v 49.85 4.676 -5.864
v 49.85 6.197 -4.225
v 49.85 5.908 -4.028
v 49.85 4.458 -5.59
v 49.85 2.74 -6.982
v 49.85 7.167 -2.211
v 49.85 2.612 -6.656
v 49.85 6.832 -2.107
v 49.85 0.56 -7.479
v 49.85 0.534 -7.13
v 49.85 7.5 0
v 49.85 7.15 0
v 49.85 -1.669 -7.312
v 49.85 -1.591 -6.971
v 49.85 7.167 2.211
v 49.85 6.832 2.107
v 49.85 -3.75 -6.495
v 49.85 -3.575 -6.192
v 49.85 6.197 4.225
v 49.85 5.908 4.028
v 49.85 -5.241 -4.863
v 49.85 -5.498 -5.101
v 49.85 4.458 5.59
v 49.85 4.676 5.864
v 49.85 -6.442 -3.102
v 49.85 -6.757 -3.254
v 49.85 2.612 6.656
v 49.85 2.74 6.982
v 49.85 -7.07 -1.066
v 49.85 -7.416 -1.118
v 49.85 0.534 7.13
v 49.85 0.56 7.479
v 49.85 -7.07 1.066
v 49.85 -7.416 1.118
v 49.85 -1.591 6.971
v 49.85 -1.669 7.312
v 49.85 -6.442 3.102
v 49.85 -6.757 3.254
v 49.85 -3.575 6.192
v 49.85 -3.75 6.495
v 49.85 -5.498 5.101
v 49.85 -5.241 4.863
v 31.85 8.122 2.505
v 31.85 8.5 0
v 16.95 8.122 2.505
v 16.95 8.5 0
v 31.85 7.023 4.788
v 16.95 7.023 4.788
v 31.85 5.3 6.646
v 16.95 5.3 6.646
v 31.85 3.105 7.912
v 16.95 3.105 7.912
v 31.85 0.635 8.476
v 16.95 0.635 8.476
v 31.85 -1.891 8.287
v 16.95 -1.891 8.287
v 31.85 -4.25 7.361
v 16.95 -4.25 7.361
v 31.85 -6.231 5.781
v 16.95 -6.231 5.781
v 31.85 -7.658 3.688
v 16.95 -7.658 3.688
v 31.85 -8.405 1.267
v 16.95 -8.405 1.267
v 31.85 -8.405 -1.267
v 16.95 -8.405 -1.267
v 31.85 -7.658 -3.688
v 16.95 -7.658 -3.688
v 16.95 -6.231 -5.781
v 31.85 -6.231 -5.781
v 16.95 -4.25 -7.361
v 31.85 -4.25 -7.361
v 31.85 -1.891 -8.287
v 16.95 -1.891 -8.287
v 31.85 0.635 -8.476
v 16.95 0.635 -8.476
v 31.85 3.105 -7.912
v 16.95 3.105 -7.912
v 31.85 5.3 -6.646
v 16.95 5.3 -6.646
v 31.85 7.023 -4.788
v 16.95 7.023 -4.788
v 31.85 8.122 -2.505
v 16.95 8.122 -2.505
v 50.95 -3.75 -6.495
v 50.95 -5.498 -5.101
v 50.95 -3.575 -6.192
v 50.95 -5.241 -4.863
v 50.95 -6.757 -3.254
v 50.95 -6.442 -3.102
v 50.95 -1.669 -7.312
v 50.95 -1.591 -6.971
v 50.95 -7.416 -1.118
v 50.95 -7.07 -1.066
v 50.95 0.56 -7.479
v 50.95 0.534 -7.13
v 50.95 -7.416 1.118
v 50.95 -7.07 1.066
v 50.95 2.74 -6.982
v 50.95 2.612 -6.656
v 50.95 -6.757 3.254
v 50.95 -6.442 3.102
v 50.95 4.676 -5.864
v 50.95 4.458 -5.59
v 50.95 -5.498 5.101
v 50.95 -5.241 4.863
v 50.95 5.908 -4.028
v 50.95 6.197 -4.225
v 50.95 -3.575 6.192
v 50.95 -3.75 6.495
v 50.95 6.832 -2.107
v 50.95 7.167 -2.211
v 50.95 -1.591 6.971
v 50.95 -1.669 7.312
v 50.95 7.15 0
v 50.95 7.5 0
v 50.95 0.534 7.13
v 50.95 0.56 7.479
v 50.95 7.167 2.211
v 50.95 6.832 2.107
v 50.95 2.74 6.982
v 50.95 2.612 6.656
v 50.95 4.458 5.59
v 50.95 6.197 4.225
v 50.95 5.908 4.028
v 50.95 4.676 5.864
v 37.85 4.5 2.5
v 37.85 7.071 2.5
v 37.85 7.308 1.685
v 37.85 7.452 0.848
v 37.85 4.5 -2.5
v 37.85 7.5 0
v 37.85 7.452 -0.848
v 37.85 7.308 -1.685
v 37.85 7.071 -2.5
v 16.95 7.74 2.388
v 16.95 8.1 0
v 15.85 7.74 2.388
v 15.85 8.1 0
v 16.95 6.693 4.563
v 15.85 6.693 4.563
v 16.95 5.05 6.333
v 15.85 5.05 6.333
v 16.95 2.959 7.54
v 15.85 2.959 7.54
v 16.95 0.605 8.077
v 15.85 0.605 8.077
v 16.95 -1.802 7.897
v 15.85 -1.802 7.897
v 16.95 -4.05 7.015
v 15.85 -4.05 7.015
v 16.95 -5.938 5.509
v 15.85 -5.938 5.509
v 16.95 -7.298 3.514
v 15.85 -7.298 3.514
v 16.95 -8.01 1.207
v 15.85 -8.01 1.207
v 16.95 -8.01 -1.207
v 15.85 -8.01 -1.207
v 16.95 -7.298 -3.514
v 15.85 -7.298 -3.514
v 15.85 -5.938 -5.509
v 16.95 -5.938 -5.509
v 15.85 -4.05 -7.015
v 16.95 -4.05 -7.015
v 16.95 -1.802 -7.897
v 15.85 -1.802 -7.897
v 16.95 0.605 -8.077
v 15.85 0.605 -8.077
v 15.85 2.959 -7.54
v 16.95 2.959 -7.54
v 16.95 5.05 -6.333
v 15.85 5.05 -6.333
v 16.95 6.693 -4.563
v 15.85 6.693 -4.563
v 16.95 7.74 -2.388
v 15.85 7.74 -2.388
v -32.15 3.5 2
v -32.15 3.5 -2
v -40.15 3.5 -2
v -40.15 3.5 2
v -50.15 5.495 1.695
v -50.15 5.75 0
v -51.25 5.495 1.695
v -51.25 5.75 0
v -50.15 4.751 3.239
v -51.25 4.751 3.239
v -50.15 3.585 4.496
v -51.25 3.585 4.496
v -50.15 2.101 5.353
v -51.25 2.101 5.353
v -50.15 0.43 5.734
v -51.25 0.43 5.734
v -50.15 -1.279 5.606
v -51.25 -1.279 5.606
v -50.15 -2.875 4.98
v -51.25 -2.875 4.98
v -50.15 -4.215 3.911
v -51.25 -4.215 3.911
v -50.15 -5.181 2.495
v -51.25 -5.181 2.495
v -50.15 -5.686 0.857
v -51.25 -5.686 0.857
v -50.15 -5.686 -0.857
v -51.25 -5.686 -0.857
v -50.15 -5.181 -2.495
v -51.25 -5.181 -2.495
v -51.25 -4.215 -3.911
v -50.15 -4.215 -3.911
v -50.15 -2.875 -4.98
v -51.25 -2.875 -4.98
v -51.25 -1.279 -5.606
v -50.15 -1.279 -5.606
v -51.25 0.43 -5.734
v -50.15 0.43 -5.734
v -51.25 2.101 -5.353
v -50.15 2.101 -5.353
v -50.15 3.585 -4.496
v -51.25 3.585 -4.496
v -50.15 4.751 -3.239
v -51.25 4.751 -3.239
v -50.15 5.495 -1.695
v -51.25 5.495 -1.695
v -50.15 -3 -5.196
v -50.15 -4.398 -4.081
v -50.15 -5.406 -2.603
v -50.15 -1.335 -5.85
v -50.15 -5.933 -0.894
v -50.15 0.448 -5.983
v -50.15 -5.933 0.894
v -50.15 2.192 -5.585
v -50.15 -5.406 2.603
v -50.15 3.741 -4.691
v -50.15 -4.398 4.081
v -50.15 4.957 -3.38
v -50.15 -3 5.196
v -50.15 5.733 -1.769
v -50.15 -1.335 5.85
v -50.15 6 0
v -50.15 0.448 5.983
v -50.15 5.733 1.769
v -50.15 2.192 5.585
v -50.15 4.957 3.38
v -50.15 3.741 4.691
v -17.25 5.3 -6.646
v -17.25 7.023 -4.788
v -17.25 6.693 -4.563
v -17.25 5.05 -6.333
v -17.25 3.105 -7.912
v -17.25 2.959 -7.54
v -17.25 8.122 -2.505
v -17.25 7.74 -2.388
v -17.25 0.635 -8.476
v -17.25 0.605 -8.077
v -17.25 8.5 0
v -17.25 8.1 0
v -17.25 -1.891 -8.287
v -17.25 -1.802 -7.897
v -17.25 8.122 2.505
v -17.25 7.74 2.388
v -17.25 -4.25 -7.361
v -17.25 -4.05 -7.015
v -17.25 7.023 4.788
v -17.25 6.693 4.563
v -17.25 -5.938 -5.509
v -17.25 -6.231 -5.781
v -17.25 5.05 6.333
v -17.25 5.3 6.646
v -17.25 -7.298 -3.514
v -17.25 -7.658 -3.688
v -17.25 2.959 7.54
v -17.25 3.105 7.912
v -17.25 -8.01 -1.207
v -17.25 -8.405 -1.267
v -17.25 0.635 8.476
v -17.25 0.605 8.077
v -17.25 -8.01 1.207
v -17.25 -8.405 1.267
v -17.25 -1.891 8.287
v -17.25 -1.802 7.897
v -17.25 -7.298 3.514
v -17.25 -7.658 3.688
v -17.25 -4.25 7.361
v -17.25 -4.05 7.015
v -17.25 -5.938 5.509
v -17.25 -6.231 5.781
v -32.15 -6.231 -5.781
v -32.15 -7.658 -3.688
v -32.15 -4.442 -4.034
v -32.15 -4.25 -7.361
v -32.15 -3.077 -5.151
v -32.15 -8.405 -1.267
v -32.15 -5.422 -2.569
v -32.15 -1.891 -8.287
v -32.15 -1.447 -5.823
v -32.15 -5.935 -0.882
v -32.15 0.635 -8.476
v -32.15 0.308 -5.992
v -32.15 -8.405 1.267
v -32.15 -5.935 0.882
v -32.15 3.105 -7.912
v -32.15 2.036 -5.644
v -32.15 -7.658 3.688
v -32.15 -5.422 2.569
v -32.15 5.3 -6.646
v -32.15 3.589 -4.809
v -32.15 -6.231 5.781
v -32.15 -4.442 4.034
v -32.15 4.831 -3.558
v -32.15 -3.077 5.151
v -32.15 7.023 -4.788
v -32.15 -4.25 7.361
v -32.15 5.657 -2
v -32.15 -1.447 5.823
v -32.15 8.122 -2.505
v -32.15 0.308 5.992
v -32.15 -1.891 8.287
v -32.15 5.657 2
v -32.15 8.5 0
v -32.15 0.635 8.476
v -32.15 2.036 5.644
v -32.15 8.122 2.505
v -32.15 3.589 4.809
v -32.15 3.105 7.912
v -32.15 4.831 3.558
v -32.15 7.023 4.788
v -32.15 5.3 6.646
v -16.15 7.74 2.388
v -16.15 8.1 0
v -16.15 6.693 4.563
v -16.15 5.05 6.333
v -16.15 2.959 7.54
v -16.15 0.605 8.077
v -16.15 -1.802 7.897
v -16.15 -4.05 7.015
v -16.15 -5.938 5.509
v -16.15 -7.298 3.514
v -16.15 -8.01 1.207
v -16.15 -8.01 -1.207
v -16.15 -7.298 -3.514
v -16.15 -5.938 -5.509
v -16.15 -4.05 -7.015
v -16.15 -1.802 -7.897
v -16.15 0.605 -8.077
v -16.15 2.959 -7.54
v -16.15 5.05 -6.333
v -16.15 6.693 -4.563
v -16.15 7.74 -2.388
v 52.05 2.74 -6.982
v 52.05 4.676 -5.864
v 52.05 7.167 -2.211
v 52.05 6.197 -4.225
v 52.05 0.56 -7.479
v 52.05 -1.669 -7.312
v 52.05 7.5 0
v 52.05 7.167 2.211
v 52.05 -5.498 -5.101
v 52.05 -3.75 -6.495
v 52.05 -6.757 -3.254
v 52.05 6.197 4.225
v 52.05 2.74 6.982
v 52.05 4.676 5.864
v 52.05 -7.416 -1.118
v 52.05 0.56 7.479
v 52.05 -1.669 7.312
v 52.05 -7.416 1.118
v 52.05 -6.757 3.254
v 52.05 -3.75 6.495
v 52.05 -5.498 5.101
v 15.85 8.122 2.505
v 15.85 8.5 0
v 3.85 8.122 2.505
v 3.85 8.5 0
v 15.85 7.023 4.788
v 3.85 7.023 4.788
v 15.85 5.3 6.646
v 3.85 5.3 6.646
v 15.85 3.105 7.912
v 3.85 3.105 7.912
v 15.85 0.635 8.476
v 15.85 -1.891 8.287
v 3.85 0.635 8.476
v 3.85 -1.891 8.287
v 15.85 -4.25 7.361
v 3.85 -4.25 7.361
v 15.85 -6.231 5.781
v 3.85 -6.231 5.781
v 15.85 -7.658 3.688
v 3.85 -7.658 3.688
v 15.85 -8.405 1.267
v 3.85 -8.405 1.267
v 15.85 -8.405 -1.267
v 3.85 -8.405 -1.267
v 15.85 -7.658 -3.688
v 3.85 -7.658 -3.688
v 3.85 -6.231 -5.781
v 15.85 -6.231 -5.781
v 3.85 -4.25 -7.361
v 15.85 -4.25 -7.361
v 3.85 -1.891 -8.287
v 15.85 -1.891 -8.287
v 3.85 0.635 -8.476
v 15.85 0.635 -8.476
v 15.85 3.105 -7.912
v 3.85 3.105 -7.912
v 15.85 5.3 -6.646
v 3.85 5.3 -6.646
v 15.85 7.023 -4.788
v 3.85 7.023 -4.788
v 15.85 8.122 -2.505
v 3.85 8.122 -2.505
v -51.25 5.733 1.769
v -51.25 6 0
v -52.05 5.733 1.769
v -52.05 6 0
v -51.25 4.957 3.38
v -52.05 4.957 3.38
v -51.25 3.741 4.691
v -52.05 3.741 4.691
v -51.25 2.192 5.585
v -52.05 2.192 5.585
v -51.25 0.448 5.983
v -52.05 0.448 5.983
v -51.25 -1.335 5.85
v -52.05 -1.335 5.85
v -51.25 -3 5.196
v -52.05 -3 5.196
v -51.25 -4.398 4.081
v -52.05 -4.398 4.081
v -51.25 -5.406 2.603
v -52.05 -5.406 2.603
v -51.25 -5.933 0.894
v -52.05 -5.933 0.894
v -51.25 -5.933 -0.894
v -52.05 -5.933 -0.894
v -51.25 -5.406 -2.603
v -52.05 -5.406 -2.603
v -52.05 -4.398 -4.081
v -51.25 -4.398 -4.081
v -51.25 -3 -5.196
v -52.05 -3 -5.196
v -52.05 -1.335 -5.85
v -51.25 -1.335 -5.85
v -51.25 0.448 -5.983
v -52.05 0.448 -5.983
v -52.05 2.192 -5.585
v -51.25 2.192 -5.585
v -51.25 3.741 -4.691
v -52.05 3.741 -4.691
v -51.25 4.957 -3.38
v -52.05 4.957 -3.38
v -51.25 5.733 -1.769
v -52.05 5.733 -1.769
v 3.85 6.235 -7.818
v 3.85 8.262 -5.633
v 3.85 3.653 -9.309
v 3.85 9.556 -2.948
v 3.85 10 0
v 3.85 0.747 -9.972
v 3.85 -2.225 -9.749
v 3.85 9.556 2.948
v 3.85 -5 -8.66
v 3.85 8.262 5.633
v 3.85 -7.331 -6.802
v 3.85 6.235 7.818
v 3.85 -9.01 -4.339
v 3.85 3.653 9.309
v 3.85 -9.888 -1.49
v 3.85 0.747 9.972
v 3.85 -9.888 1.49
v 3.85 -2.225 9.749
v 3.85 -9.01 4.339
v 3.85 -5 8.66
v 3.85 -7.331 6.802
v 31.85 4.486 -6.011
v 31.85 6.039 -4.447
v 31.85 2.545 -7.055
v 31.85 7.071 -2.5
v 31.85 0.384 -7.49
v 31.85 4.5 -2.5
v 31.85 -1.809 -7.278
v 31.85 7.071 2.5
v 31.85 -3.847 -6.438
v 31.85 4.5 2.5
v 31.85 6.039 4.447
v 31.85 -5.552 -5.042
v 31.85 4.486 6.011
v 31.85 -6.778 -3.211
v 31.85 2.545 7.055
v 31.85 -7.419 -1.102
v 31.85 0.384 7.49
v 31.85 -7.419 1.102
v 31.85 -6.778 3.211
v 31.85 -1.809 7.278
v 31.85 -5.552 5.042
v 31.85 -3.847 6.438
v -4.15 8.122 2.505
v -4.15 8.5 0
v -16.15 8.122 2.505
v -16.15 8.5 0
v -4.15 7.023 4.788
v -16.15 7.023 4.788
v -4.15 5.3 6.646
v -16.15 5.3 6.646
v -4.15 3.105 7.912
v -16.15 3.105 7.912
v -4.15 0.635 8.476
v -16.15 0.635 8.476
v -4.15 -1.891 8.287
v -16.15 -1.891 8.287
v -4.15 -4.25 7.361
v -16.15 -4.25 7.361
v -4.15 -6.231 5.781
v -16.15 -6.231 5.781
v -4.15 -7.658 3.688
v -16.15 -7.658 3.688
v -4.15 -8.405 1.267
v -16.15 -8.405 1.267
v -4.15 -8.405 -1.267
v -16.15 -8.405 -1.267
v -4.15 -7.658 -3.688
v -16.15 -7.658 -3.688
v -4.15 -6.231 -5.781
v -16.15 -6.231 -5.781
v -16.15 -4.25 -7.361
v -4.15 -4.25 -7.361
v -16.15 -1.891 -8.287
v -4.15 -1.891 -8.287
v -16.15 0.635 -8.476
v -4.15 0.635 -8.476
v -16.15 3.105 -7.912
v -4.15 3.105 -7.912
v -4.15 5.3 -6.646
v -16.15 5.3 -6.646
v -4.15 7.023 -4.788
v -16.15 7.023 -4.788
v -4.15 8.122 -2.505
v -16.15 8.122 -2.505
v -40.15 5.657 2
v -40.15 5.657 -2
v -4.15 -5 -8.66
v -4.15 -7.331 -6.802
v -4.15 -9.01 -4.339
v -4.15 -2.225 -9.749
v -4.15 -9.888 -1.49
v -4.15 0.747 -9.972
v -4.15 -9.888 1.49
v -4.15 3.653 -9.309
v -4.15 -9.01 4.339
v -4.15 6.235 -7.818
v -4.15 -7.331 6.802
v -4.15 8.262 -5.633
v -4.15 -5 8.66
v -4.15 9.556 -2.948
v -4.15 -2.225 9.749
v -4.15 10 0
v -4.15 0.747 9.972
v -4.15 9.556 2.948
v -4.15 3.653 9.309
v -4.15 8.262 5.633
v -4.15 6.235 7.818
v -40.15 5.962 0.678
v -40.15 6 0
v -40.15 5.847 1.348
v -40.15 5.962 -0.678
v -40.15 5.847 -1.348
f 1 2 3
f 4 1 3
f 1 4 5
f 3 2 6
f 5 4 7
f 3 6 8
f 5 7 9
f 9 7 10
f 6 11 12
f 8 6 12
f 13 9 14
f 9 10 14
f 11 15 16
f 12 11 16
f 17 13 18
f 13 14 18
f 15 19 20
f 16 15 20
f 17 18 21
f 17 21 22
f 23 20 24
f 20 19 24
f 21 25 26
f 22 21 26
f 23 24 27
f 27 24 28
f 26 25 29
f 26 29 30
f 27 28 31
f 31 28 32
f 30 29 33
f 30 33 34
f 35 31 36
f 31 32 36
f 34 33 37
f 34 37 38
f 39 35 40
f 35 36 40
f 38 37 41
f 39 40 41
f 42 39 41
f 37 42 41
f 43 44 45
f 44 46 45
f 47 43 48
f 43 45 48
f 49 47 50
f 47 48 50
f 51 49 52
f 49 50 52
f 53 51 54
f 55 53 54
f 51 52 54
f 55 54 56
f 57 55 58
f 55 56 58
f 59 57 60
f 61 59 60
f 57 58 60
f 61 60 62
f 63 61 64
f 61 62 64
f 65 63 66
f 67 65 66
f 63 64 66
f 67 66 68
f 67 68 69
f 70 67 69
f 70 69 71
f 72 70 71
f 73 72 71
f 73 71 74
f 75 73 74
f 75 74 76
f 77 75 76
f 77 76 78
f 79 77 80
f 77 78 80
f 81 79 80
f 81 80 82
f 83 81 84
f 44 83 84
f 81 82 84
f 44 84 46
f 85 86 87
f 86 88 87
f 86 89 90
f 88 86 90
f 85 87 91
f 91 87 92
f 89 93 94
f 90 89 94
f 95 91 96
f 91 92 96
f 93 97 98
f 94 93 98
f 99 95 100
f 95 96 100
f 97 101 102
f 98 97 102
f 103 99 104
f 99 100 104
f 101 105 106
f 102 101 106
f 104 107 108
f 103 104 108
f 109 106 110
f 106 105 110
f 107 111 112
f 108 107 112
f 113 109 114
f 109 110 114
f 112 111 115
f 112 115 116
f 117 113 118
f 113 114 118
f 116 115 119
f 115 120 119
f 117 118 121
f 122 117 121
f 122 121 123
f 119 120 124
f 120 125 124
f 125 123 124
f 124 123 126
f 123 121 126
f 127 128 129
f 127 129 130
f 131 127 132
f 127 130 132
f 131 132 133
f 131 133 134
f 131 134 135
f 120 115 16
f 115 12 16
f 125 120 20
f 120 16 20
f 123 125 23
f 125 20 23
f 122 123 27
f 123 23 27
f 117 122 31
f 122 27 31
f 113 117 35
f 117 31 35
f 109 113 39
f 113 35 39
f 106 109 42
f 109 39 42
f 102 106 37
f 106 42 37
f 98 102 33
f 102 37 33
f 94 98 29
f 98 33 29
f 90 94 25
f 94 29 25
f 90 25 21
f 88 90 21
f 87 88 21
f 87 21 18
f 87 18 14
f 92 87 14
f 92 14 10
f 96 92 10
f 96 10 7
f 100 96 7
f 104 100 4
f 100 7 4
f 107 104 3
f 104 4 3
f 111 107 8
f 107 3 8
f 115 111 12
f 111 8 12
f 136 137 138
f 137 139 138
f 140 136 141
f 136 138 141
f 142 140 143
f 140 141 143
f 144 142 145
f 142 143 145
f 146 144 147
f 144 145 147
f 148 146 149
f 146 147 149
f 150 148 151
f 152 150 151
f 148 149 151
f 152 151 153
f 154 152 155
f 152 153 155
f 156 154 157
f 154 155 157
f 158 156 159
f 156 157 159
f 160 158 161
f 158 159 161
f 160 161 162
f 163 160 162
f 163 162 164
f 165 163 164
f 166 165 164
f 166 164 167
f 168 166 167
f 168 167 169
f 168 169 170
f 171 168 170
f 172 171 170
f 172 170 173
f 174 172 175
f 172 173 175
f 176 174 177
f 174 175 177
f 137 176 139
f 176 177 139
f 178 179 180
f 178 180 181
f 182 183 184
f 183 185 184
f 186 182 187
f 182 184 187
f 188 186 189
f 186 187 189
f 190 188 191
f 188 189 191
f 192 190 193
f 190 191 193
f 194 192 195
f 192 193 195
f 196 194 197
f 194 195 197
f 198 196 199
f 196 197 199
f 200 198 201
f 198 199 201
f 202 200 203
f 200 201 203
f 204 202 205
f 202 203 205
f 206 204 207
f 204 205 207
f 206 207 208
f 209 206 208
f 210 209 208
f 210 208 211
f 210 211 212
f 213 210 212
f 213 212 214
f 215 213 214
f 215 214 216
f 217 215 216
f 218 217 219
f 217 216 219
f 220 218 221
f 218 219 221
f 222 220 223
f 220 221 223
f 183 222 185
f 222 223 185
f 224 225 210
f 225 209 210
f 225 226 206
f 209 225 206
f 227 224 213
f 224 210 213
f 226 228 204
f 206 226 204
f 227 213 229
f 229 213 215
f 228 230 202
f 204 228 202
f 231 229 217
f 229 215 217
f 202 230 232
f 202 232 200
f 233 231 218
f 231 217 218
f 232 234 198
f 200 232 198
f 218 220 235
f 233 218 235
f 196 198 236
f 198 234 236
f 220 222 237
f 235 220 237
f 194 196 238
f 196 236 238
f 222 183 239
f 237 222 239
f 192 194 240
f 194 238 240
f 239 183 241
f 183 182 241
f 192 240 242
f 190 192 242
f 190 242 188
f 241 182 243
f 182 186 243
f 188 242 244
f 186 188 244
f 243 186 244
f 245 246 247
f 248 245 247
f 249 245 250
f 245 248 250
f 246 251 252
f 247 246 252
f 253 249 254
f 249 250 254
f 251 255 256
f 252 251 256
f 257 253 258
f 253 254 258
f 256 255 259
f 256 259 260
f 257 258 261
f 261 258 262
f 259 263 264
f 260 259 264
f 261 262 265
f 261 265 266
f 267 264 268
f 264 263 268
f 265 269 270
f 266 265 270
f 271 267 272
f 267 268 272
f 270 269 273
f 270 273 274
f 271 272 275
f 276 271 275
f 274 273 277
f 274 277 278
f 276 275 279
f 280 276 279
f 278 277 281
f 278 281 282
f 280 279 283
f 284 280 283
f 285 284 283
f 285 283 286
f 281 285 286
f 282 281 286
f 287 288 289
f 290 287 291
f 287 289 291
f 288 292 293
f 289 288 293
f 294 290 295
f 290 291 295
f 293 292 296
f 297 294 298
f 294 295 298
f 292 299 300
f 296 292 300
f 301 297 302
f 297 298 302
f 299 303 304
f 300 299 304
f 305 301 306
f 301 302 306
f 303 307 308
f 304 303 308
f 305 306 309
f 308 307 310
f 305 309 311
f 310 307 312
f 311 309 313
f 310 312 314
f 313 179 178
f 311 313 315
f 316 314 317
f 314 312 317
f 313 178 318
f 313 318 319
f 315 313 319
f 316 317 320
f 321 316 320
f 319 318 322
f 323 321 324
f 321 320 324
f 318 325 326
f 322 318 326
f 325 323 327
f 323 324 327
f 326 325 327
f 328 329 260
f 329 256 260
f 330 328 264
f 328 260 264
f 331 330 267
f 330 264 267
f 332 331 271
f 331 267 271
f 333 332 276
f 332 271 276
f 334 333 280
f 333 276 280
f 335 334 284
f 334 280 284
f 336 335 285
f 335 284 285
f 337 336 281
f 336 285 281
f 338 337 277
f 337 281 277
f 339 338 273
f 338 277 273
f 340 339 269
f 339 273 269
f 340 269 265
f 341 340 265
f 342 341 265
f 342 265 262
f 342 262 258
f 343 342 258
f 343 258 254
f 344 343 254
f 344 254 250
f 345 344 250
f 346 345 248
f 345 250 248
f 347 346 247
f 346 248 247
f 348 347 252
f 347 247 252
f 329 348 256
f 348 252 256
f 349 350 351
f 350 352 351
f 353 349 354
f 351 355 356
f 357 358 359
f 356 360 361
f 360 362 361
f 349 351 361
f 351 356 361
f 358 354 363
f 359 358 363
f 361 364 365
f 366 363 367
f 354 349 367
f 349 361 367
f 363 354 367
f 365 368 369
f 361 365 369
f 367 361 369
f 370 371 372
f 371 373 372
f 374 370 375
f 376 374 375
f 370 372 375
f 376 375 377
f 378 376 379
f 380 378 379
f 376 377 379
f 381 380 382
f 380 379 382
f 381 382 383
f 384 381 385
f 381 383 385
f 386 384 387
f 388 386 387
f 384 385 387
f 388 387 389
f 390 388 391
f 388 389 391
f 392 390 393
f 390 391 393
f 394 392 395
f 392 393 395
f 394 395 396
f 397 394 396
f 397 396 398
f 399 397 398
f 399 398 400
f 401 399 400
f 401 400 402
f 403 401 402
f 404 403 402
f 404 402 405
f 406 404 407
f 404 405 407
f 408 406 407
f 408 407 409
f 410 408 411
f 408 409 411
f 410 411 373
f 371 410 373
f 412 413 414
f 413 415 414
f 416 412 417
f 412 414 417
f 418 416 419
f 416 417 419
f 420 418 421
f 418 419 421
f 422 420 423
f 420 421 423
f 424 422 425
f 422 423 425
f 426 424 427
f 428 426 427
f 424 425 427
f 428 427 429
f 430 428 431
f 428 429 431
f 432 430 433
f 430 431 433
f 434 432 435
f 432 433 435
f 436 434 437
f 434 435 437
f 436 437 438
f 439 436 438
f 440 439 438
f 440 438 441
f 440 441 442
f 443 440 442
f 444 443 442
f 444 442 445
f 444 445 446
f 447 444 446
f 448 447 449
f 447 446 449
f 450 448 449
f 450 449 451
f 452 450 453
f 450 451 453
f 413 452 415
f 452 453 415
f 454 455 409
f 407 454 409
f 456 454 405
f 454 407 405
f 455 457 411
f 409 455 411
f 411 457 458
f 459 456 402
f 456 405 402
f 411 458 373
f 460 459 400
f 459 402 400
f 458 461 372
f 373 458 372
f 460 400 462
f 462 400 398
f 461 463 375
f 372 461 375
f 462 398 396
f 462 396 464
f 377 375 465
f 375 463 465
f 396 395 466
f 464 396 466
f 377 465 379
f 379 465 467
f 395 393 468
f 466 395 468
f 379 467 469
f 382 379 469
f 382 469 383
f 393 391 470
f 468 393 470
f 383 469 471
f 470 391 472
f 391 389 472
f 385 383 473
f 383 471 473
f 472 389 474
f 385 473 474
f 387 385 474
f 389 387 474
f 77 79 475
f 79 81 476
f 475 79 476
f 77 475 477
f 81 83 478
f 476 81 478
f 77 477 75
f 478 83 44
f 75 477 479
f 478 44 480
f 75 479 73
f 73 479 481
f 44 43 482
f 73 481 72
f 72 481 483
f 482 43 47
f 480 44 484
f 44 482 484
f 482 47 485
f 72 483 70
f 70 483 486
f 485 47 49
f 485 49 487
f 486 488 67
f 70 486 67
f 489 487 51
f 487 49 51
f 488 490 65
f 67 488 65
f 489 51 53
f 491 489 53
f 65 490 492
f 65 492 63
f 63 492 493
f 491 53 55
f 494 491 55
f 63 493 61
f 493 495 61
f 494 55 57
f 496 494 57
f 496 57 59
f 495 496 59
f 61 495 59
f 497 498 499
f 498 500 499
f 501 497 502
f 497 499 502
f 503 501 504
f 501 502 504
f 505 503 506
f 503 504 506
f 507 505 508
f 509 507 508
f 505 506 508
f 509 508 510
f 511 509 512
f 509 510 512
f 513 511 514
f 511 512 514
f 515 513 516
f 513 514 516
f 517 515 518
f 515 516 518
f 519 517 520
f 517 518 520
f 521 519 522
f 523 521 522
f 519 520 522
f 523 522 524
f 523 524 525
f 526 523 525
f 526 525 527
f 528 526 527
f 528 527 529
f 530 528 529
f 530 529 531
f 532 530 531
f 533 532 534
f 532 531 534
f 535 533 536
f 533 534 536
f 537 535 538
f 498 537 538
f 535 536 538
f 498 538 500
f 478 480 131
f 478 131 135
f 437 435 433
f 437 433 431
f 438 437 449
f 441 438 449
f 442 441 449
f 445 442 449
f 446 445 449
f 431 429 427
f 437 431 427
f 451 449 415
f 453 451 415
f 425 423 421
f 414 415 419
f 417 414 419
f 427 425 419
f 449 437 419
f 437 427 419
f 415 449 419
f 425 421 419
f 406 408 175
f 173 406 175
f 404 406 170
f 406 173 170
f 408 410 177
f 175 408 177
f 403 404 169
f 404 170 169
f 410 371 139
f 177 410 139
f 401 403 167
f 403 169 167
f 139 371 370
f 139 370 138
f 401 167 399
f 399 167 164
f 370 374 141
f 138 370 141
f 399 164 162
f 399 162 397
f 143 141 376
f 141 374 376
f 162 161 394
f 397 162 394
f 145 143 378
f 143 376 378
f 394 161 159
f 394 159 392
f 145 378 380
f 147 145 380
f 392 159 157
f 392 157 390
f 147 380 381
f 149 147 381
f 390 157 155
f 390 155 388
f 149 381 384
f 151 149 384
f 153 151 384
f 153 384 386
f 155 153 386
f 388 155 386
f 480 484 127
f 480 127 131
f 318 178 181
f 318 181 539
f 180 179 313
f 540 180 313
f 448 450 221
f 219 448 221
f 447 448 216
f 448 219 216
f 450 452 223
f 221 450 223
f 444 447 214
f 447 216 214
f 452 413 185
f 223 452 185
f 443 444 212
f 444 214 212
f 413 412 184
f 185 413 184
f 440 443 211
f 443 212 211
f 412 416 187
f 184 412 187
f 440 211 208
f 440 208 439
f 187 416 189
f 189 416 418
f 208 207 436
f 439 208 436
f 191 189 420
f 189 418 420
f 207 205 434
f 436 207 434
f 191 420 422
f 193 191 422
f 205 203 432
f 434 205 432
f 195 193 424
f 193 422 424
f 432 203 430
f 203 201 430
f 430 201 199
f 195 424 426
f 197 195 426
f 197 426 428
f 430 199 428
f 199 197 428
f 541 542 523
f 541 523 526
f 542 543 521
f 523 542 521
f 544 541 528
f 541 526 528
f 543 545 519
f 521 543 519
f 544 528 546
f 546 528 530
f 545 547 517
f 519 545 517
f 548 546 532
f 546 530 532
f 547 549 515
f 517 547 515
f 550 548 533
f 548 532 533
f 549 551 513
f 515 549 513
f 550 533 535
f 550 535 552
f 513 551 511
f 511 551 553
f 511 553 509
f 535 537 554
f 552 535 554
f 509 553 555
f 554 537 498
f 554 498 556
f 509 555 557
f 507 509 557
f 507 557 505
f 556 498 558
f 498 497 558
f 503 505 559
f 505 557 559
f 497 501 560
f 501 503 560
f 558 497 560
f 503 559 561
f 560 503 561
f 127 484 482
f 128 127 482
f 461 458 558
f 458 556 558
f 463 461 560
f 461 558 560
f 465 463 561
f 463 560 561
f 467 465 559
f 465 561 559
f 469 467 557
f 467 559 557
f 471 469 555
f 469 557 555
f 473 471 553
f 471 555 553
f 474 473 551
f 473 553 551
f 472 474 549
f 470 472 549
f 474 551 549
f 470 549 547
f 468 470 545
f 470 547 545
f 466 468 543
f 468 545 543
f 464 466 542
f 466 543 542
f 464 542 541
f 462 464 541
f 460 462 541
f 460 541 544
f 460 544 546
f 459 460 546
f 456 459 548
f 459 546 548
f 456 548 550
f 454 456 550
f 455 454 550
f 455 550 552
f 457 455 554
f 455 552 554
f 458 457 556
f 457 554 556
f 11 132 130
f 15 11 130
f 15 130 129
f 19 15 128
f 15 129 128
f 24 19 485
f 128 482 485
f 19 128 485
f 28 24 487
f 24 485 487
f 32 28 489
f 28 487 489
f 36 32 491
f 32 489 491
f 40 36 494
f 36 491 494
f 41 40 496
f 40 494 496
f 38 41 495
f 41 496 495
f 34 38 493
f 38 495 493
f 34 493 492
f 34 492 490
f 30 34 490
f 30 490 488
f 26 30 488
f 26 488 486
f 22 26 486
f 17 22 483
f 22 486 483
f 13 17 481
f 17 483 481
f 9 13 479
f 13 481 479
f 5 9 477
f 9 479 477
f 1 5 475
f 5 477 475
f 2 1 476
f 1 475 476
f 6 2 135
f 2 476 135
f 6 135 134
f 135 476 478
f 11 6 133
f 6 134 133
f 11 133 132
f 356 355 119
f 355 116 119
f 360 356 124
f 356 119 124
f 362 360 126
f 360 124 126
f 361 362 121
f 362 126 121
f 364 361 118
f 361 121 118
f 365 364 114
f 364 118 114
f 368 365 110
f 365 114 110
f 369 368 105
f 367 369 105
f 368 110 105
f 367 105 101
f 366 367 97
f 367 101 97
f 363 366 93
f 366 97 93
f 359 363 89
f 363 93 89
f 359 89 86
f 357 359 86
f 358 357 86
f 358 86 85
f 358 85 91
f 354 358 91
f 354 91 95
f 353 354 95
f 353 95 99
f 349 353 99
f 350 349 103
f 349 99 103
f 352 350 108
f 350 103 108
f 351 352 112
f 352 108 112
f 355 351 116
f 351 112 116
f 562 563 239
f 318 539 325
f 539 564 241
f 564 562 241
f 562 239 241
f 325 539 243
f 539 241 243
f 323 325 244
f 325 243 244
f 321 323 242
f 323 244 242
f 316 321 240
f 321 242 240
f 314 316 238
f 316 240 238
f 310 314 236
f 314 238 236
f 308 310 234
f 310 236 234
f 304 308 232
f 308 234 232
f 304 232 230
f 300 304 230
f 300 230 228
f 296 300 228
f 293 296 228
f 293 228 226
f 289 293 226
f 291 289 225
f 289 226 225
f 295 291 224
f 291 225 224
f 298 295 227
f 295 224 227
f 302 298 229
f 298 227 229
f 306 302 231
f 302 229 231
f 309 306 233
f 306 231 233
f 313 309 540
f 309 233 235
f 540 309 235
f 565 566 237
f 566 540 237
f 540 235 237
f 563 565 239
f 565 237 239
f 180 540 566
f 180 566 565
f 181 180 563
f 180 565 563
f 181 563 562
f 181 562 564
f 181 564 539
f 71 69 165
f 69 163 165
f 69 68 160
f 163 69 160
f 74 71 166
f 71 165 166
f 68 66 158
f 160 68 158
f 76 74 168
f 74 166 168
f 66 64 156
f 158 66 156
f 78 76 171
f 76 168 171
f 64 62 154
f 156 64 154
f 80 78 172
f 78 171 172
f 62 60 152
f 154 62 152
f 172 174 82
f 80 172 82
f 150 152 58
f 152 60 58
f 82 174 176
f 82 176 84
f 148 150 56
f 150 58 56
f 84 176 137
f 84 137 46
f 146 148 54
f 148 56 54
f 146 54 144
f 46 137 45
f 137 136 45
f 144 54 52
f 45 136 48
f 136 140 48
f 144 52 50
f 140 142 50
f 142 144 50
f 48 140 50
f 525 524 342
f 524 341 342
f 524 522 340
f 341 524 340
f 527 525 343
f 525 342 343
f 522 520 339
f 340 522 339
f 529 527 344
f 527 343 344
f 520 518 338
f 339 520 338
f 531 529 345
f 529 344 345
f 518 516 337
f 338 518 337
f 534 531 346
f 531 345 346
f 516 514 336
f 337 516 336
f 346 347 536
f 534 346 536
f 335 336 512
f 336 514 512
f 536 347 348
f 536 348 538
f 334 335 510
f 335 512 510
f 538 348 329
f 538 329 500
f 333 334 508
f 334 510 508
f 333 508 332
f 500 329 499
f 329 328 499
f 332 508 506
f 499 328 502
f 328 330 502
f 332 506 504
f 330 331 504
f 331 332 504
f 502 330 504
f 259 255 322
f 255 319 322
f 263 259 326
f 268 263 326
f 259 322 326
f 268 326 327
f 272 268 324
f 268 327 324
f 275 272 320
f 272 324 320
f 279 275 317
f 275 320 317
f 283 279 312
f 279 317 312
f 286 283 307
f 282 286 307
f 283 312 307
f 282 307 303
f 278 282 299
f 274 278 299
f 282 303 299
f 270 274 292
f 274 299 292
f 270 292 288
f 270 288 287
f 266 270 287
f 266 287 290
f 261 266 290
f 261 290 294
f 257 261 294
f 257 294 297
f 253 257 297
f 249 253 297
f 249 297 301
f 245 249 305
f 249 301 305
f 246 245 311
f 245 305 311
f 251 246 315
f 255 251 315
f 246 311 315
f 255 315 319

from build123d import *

# Parameters (mm, degrees)
SKETCH2_W          = 4
SKETCH2_H          = 2.5
CUT_EXTRUDE1_DEPTH = 8
SKETCH3_W          = 5
SKETCH3_H          = 3
CUT_EXTRUDE2_DEPTH = 6


with BuildPart() as part:
    # Sketch1 → Revolve1 (revolve)
    with BuildSketch(Plane.XY):
        Polygon((-52.05, 0), (52.05, 0), (52.05, 7.5), (50.95, 7.5), (50.95, 7.15), (49.85, 7.15), (49.85, 7.5), (31.85, 7.5), (31.85, 8.5), (16.95, 8.5), (16.95, 8.1), (15.85, 8.1), (15.85, 8.5), (3.85, 8.5), (3.85, 10), (-4.15, 10), (-4.15, 8.5), (-16.15, 8.5), (-16.15, 8.1), (-17.25, 8.1), (-17.25, 8.5), (-32.15, 8.5), (-32.15, 6), (-50.15, 6), (-50.15, 5.75), (-51.25, 5.75), (-51.25, 6), (-52.05, 6), align=None)
    revolve(axis=Axis((-52.05, 0, 0), (1, 0, 0)))

    # Sketch2 → Cut-Extrude1 (cut)
    with BuildSketch(Plane.ZY.offset(32.15)):
        with Locations((0, 4.75)):
            Rectangle(SKETCH2_W, SKETCH2_H)
    extrude(amount=CUT_EXTRUDE1_DEPTH, mode=Mode.SUBTRACT)

    # Sketch3 → Cut-Extrude2 (cut)
    with BuildSketch(Plane(origin=(31.85, 0, 0), x_dir=(0, 0, -1), z_dir=(1, 0, 0))):
        with Locations((0, 6)):
            Rectangle(SKETCH3_W, SKETCH3_H)
    extrude(amount=CUT_EXTRUDE2_DEPTH, mode=Mode.SUBTRACT)


solid = part.part
